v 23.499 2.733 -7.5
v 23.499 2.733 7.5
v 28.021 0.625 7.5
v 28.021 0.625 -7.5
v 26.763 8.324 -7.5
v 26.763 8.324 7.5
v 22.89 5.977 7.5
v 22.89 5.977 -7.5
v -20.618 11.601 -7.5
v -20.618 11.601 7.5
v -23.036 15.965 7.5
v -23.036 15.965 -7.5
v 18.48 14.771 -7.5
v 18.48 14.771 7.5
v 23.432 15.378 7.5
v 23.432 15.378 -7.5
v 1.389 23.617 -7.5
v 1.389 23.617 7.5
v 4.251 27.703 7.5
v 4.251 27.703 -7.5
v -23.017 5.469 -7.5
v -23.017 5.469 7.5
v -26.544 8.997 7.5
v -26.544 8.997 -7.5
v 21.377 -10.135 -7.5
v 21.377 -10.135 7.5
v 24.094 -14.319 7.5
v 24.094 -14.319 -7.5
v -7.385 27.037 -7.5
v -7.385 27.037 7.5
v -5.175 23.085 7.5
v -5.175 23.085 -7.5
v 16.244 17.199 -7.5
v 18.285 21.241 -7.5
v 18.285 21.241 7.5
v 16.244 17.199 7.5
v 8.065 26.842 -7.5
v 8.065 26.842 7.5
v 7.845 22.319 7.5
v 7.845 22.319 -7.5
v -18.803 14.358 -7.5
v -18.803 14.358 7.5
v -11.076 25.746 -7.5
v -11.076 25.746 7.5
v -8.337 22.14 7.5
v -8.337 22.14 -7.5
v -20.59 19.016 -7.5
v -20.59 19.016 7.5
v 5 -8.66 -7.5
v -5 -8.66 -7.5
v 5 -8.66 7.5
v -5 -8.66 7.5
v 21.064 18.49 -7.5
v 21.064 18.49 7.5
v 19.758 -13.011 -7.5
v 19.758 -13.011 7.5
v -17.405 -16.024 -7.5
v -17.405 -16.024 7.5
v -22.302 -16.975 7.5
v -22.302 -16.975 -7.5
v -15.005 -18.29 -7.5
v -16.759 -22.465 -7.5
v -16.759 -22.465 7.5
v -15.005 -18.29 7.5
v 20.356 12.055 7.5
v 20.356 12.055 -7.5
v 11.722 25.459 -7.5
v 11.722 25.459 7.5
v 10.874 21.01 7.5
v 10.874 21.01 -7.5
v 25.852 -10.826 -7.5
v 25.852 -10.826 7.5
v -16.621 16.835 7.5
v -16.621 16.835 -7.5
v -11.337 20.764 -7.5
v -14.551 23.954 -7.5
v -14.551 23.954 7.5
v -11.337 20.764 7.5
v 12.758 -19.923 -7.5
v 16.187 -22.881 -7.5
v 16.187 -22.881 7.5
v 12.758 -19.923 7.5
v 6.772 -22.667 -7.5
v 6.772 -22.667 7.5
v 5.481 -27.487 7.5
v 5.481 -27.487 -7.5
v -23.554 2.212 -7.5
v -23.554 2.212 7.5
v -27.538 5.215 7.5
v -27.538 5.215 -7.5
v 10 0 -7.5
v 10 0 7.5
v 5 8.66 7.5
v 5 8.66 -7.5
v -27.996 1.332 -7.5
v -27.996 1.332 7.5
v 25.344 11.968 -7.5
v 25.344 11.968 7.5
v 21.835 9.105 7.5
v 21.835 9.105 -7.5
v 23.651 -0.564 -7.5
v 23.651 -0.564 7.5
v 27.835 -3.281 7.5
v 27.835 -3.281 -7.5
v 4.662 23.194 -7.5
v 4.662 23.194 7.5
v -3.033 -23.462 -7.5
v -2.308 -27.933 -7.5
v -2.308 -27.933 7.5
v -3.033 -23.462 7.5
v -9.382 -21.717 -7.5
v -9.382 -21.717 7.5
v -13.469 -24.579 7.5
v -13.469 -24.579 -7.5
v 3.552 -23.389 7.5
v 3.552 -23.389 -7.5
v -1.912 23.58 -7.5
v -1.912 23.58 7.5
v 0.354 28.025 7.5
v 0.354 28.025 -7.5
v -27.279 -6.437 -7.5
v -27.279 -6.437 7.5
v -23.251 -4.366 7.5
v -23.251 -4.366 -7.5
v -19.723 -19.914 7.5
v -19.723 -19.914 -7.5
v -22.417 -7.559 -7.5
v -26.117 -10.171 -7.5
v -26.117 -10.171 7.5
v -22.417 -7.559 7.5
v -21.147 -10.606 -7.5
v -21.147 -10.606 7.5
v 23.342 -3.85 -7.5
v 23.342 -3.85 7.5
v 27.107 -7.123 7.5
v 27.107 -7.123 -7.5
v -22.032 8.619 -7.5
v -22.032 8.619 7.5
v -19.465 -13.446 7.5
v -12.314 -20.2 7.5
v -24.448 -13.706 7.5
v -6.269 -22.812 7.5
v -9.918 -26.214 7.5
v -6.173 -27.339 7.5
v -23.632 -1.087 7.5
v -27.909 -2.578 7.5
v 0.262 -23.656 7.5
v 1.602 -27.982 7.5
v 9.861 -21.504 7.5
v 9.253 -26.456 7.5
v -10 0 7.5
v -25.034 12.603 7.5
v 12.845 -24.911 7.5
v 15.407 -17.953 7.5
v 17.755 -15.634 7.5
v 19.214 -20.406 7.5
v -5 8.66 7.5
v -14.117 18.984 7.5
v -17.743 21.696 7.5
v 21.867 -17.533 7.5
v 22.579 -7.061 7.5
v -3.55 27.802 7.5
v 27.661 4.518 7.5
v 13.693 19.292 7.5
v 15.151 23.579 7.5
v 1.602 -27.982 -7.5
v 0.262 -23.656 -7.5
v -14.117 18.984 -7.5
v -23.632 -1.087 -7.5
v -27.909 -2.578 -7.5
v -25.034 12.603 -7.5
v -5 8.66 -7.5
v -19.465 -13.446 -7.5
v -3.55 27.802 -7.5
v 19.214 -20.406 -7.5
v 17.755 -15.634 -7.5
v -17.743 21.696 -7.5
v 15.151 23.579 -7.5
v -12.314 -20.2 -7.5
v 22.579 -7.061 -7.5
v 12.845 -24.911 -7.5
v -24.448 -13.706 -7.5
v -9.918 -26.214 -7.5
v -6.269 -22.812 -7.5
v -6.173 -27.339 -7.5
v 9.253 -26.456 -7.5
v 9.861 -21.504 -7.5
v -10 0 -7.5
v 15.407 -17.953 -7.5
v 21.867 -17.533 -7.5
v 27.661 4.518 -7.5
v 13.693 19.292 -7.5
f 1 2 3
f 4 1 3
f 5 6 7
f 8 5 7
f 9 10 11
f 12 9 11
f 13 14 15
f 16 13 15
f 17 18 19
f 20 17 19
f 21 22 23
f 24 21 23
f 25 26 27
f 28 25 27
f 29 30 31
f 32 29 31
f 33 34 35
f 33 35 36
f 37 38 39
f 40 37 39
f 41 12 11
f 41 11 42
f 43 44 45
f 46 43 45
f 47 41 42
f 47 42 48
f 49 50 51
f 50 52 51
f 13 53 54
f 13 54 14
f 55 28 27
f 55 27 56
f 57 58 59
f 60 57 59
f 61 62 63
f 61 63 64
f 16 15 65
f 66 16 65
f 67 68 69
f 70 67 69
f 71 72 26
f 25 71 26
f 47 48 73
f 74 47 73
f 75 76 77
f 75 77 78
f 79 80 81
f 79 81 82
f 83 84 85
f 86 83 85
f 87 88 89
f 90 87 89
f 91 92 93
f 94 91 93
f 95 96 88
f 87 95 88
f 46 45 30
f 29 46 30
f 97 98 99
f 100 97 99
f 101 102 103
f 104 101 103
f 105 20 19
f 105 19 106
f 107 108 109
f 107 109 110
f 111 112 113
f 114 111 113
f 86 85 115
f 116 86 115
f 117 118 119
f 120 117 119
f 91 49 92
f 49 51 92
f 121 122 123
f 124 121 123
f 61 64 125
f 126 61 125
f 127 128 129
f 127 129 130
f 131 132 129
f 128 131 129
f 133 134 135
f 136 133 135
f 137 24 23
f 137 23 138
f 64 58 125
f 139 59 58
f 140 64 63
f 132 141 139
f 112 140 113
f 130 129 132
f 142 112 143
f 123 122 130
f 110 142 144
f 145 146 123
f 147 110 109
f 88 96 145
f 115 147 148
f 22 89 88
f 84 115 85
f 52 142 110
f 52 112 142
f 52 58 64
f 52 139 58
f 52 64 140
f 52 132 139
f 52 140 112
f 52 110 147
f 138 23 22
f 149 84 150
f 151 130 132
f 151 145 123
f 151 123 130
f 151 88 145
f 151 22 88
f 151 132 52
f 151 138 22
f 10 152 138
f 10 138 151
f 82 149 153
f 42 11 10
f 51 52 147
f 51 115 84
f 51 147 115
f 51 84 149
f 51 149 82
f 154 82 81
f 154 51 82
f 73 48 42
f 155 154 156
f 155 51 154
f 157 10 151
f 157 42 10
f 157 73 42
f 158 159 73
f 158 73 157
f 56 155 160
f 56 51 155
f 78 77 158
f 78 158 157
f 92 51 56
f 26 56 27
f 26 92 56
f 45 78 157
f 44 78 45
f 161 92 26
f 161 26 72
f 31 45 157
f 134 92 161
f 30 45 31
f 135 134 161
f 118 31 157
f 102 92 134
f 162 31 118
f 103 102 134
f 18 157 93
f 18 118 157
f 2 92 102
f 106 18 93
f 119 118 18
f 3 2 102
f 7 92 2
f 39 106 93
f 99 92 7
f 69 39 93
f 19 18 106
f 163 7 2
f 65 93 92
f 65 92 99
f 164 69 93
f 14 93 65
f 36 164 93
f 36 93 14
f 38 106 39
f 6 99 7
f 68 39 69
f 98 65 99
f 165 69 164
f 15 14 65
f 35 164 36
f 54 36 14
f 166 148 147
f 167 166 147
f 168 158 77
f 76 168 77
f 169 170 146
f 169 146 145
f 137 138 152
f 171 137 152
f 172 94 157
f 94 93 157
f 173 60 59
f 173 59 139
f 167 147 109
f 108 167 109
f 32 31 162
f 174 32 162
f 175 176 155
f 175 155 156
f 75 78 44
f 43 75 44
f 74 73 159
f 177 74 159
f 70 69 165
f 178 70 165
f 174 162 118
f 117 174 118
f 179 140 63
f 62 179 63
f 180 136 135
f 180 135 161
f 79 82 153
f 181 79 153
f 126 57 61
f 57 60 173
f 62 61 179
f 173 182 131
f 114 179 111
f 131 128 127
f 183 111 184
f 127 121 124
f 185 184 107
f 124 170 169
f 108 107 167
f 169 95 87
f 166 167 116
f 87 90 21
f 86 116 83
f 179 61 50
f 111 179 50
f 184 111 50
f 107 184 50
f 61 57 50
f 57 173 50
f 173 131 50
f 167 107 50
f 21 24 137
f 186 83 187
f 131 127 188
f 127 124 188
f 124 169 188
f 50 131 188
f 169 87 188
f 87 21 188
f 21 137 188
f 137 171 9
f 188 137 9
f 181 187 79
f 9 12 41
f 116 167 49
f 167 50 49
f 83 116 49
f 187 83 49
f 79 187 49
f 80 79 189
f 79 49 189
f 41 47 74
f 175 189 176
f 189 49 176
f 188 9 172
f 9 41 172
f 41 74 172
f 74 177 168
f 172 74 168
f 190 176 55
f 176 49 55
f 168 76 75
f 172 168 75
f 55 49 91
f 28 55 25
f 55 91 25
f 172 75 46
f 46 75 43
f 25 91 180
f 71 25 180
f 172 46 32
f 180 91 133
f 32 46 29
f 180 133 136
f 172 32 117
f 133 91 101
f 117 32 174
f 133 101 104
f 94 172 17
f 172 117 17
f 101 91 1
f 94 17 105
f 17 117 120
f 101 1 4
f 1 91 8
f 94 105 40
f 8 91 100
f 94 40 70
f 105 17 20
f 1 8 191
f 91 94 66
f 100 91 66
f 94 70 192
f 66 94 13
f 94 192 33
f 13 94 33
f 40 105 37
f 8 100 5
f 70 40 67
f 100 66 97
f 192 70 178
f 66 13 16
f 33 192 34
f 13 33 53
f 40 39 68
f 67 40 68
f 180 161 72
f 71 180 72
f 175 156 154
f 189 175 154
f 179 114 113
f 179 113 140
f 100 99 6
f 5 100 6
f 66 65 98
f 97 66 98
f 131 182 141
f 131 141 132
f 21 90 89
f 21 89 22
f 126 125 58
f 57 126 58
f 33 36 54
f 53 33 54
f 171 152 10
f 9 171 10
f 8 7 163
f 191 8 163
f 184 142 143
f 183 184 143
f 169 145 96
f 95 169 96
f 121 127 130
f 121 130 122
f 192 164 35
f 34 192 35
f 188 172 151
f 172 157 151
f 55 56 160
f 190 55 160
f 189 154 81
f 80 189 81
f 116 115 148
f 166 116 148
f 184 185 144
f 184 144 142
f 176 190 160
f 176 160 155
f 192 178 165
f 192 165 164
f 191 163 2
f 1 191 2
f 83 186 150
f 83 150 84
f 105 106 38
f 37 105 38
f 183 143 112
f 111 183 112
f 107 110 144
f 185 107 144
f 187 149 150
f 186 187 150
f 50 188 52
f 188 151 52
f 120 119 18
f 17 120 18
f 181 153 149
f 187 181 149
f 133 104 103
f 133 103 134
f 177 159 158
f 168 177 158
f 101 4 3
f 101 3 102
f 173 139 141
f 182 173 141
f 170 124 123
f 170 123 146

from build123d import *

# Parameters (mm, degrees)
SCHIZZO1_R                   = 34.641016151
ESTRUSIONE_ESTRUSIONE1_DEPTH = 7.5
TAGLIO_ESTRUSIONE1_DEPTH     = 52.23475383
RIPETIZIONECIRCOLARE1_COUNT  = 45


with BuildPart() as part:
    # Schizzo1 → Estrusione-Estrusione1 (new, symmetric)
    with BuildSketch(Plane.XY):
        Circle(SCHIZZO1_R)
        Polygon((10, 0), (5, 8.660254038), (-5, 8.660254038), (-10, 0), (-5, -8.660254038), (5, -8.660254038), align=None, mode=Mode.SUBTRACT)
    extrude(amount=ESTRUSIONE_ESTRUSIONE1_DEPTH, both=True)

    # Schizzo2 → Taglio-Estrusione1 (cut, through all)
    with BuildSketch(Plane.XY.offset(7.5)):
        Polygon((-6.551263351, 35.534227752), (-1.911546114, 23.580132753), (5.348246738, 37.826793916), align=None)
    taglio_estrusione1 = extrude(amount=-TAGLIO_ESTRUSIONE1_DEPTH, mode=Mode.SUBTRACT)

    # RipetizioneCircolare1: Taglio-Estrusione1 ×45 about axis
    ripetizionecircolare1_axis = Axis((0, 0, 0), (0, 0, 1))
    for i in range(1, RIPETIZIONECIRCOLARE1_COUNT):
        add(taglio_estrusione1.rotate(ripetizionecircolare1_axis, i * 360 / RIPETIZIONECIRCOLARE1_COUNT), mode=Mode.SUBTRACT)


solid = part.part
